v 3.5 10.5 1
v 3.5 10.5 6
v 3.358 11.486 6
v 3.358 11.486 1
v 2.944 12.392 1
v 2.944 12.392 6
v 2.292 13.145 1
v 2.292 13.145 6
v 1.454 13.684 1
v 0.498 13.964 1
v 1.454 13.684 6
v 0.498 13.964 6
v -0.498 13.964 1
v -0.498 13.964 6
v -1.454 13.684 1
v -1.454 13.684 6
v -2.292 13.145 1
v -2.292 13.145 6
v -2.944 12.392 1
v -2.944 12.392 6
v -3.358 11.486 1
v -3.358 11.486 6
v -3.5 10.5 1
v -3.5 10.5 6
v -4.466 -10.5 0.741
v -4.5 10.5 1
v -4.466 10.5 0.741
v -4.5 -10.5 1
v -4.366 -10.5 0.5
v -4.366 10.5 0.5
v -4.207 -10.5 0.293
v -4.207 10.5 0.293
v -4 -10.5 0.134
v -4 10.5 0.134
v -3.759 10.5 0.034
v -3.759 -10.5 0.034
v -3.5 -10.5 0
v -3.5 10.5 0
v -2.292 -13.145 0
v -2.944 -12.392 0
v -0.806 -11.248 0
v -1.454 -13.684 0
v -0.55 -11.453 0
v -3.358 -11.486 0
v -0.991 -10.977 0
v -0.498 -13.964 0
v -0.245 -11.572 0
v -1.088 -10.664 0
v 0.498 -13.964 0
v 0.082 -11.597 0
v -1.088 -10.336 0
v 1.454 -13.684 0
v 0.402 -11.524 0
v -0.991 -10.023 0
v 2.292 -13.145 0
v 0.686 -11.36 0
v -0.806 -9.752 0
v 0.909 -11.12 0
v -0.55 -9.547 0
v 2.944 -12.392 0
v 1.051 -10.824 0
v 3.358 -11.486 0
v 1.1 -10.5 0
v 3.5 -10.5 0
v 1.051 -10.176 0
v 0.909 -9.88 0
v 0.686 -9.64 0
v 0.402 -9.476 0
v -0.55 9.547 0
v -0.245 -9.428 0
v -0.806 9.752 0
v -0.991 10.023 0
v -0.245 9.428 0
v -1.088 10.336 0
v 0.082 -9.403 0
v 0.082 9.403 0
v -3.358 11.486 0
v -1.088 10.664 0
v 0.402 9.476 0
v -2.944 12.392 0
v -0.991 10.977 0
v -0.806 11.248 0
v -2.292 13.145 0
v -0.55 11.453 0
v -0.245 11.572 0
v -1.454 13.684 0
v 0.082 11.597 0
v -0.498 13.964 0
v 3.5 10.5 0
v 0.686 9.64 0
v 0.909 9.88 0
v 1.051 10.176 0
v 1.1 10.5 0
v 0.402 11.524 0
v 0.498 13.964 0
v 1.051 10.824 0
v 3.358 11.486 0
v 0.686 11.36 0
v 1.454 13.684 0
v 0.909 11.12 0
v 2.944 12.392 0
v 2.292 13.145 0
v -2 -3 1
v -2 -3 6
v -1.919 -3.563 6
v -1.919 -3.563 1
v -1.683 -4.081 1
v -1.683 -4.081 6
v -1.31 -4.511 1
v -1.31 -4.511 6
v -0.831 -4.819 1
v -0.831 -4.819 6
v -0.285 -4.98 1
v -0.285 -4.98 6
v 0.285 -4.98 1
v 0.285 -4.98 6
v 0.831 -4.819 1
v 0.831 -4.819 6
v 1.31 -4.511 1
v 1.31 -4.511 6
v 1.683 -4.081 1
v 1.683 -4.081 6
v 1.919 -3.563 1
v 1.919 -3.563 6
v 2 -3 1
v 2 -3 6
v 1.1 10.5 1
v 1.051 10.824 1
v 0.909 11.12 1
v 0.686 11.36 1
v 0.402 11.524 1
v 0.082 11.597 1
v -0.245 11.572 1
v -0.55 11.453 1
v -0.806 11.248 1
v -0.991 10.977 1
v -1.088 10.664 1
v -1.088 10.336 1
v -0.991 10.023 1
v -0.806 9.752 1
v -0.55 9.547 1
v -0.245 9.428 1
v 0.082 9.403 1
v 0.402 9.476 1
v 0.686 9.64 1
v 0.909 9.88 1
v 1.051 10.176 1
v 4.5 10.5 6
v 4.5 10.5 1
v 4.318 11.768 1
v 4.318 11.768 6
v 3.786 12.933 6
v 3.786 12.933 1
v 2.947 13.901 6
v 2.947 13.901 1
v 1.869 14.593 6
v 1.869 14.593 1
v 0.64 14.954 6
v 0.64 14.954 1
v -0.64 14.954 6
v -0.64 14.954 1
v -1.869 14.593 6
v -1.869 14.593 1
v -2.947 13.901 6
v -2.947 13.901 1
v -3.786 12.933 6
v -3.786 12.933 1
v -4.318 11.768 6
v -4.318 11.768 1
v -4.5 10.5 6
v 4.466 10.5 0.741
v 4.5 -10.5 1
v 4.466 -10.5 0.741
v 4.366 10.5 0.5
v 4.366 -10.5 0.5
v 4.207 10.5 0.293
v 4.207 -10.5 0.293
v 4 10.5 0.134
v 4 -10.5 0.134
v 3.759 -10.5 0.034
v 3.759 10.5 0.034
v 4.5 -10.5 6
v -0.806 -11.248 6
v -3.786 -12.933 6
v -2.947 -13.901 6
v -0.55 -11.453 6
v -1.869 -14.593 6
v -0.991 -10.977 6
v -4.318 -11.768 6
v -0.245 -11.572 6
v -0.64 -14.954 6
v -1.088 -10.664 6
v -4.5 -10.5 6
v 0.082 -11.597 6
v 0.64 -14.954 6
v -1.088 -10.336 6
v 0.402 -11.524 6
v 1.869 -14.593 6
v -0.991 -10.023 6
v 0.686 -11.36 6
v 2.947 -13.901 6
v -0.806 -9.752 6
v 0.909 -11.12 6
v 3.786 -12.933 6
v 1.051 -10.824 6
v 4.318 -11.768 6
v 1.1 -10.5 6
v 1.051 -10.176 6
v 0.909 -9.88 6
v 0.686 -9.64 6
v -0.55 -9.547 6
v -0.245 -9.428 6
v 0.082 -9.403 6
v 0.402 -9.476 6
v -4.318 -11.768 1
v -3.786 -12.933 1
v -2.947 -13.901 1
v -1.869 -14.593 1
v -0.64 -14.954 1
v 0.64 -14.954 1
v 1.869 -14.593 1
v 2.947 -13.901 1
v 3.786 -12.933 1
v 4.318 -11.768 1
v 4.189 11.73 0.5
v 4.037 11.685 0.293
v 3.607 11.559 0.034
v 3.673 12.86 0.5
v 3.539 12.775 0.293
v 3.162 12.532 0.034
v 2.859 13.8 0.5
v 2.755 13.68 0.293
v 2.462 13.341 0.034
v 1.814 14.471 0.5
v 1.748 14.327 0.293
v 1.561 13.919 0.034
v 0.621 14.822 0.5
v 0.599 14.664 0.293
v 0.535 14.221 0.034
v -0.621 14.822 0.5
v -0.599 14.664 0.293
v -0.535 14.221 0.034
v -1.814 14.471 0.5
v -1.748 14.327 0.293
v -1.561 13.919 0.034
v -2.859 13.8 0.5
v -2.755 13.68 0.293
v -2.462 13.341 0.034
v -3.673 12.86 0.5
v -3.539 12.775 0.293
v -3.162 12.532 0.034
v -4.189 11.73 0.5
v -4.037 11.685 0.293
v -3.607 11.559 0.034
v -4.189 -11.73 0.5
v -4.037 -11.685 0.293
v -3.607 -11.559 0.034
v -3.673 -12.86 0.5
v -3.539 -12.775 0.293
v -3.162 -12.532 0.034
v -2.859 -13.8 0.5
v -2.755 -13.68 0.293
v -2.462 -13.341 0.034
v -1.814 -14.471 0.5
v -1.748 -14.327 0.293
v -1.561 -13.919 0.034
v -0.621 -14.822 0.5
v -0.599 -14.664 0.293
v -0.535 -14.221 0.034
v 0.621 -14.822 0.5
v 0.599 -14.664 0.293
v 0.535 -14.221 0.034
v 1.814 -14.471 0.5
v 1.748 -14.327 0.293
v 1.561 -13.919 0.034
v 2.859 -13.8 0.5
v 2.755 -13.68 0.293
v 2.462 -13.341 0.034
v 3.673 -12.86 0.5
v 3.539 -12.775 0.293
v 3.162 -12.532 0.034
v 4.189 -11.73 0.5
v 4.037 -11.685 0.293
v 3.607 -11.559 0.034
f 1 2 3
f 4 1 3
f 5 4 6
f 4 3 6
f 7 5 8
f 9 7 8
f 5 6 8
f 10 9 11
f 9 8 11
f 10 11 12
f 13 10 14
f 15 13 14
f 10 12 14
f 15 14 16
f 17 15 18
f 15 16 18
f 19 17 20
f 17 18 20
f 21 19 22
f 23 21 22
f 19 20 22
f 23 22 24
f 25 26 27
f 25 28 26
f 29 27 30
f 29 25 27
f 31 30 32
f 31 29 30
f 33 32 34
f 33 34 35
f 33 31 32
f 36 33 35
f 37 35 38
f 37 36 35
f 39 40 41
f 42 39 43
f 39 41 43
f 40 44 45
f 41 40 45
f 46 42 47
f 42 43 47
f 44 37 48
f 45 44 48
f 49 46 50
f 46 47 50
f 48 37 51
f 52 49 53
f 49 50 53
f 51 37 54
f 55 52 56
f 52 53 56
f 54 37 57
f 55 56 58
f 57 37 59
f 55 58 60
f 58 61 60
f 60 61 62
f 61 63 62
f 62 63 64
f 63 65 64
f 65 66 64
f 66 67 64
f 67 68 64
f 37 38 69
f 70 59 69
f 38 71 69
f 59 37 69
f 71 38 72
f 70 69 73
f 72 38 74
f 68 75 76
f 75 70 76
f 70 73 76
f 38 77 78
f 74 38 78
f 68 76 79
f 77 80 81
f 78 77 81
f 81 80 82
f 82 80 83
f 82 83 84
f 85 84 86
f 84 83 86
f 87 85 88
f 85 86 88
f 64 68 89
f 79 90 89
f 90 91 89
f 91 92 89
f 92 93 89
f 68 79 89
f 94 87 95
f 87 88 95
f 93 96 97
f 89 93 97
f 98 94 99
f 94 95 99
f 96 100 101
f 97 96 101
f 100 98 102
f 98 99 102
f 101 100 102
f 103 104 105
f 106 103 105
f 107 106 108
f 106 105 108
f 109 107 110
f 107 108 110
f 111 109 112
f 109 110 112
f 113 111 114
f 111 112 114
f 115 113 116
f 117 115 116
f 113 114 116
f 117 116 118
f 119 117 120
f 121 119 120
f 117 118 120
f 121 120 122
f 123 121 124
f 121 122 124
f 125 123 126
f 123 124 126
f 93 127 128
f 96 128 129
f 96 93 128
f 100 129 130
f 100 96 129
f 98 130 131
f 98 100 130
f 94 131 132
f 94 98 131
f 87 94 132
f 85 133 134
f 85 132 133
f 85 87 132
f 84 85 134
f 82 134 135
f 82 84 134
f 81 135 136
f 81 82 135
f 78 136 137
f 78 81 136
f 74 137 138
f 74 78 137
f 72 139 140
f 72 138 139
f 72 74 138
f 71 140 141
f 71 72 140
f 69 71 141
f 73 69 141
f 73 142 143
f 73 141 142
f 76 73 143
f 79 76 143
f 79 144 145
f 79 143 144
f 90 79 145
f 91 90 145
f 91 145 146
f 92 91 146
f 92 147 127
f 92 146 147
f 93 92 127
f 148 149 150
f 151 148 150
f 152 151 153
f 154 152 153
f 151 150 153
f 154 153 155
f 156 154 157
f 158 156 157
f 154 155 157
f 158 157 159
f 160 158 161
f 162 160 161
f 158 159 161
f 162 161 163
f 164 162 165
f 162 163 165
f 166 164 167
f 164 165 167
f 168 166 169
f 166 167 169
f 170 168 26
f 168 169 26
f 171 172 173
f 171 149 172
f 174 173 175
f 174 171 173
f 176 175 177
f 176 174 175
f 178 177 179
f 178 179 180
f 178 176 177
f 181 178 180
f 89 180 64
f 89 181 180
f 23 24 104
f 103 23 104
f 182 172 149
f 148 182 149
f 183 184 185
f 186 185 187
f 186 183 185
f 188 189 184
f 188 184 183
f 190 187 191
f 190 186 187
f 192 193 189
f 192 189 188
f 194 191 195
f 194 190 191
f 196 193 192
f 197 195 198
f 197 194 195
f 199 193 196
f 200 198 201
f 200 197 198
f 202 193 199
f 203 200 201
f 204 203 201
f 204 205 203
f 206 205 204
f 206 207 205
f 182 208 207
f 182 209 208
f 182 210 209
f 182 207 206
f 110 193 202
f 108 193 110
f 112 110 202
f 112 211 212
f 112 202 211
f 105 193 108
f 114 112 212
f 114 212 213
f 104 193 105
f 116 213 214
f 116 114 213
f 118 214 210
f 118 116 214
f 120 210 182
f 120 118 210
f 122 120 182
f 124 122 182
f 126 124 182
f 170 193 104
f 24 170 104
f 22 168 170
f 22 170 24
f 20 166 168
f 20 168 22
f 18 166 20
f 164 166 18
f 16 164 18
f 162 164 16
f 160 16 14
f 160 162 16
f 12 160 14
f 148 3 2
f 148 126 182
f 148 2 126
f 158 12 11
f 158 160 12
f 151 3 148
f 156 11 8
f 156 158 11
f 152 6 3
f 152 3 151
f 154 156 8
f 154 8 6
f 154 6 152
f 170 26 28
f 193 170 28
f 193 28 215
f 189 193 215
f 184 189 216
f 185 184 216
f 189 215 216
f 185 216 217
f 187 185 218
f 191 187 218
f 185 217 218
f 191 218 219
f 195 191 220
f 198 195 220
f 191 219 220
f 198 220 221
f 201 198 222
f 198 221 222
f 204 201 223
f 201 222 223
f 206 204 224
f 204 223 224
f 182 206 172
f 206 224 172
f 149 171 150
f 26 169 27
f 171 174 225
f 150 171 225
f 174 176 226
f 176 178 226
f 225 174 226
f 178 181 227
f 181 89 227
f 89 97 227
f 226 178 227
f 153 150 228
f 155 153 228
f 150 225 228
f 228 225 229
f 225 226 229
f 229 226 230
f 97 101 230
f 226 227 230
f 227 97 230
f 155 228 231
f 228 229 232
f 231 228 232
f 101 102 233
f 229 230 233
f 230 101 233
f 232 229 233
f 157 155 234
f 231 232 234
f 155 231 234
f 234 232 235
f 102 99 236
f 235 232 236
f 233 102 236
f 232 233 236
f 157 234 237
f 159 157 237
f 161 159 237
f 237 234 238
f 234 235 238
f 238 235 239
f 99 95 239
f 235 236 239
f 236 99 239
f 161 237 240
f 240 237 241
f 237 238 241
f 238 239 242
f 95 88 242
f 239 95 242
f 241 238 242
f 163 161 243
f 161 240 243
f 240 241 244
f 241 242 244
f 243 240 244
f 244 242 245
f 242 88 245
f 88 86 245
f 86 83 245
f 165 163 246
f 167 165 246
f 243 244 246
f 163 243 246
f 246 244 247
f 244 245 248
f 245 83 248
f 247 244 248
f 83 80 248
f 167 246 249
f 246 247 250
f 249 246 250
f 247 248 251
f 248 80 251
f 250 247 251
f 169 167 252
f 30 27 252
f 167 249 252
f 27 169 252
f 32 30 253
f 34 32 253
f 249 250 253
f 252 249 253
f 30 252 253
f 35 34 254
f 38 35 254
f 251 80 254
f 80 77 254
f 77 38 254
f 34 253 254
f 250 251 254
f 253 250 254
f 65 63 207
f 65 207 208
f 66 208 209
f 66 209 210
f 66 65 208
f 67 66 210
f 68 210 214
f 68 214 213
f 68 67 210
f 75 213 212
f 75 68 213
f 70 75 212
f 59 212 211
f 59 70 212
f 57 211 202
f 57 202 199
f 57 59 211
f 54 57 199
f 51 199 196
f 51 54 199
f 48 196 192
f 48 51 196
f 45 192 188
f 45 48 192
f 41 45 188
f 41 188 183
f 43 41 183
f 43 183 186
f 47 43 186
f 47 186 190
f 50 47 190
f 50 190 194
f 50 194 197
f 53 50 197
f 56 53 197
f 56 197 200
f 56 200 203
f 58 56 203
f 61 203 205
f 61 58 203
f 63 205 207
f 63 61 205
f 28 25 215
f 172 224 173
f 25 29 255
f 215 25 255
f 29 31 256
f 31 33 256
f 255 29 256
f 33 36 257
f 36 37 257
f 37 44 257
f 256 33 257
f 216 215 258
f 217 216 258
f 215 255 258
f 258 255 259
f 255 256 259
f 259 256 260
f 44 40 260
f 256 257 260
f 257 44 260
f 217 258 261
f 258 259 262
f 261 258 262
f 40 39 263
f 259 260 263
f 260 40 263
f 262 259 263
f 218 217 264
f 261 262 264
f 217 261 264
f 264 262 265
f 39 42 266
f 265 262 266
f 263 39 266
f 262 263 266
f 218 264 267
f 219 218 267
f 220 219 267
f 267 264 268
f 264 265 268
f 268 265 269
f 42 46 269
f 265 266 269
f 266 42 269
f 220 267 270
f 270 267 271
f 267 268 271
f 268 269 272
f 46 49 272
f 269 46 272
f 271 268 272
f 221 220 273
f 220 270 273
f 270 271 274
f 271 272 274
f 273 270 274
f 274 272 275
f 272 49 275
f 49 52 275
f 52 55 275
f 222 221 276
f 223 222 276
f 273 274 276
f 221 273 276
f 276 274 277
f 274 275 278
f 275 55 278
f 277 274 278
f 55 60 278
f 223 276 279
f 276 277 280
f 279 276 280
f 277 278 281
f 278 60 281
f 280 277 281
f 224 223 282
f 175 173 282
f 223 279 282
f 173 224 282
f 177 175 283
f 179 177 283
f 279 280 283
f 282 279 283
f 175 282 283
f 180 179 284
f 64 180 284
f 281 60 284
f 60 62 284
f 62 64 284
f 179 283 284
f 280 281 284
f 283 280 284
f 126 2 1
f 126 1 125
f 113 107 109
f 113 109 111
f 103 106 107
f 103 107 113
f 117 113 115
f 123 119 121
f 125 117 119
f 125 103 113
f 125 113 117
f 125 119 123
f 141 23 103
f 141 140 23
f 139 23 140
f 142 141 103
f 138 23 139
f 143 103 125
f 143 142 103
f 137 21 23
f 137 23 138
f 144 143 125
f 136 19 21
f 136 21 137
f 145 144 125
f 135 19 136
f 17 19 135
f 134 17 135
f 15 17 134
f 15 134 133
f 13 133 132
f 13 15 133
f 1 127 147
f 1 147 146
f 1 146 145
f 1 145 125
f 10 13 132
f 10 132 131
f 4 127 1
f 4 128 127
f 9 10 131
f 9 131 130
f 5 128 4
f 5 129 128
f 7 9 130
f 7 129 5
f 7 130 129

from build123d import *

# Parameters (mm, degrees)
SKETCH_R     = 1.1
PAD_DEPTH    = 6
POCKET_DEPTH = 5
FILLET_R     = 1


with BuildPart() as part:
    # Sketch → Pad (new body)
    with BuildSketch(Plane.XY):
        with BuildLine():
            ThreePointArc((4.5, 10.5), (0, 15), (-4.5, 10.5))
            Line((-4.5, 10.5), (-4.5, -10.5))
            ThreePointArc((-4.5, -10.5), (0, -15), (4.5, -10.5))
            Line((4.5, -10.5), (4.5, 10.5))
        make_face()
        with Locations((0, 10.5)):
            Circle(SKETCH_R, mode=Mode.SUBTRACT)
        with Locations((0, -10.5)):
            Circle(SKETCH_R, mode=Mode.SUBTRACT)
    extrude(amount=PAD_DEPTH)

    # Sketch001 (on Face8 of Pad) → Pocket (cut)
    with BuildSketch(Plane.XY.offset(6)):
        with BuildLine():
            ThreePointArc((3.5, 10.5), (0, 14), (-3.5, 10.5))
            Line((-3.5, 10.5), (-2, -3))
            ThreePointArc((-2, -3), (0, -5), (2, -3))
            Line((3.5, 10.5), (2, -3))
        make_face()
    extrude(amount=-POCKET_DEPTH, mode=Mode.SUBTRACT)

    # Fillet
    fillet_edges = [part.edges().sort_by_distance(p)[0] for p in [
        (4.5, 0, 0),
    ]]
    fillet(fillet_edges, radius=FILLET_R)


solid = part.part
